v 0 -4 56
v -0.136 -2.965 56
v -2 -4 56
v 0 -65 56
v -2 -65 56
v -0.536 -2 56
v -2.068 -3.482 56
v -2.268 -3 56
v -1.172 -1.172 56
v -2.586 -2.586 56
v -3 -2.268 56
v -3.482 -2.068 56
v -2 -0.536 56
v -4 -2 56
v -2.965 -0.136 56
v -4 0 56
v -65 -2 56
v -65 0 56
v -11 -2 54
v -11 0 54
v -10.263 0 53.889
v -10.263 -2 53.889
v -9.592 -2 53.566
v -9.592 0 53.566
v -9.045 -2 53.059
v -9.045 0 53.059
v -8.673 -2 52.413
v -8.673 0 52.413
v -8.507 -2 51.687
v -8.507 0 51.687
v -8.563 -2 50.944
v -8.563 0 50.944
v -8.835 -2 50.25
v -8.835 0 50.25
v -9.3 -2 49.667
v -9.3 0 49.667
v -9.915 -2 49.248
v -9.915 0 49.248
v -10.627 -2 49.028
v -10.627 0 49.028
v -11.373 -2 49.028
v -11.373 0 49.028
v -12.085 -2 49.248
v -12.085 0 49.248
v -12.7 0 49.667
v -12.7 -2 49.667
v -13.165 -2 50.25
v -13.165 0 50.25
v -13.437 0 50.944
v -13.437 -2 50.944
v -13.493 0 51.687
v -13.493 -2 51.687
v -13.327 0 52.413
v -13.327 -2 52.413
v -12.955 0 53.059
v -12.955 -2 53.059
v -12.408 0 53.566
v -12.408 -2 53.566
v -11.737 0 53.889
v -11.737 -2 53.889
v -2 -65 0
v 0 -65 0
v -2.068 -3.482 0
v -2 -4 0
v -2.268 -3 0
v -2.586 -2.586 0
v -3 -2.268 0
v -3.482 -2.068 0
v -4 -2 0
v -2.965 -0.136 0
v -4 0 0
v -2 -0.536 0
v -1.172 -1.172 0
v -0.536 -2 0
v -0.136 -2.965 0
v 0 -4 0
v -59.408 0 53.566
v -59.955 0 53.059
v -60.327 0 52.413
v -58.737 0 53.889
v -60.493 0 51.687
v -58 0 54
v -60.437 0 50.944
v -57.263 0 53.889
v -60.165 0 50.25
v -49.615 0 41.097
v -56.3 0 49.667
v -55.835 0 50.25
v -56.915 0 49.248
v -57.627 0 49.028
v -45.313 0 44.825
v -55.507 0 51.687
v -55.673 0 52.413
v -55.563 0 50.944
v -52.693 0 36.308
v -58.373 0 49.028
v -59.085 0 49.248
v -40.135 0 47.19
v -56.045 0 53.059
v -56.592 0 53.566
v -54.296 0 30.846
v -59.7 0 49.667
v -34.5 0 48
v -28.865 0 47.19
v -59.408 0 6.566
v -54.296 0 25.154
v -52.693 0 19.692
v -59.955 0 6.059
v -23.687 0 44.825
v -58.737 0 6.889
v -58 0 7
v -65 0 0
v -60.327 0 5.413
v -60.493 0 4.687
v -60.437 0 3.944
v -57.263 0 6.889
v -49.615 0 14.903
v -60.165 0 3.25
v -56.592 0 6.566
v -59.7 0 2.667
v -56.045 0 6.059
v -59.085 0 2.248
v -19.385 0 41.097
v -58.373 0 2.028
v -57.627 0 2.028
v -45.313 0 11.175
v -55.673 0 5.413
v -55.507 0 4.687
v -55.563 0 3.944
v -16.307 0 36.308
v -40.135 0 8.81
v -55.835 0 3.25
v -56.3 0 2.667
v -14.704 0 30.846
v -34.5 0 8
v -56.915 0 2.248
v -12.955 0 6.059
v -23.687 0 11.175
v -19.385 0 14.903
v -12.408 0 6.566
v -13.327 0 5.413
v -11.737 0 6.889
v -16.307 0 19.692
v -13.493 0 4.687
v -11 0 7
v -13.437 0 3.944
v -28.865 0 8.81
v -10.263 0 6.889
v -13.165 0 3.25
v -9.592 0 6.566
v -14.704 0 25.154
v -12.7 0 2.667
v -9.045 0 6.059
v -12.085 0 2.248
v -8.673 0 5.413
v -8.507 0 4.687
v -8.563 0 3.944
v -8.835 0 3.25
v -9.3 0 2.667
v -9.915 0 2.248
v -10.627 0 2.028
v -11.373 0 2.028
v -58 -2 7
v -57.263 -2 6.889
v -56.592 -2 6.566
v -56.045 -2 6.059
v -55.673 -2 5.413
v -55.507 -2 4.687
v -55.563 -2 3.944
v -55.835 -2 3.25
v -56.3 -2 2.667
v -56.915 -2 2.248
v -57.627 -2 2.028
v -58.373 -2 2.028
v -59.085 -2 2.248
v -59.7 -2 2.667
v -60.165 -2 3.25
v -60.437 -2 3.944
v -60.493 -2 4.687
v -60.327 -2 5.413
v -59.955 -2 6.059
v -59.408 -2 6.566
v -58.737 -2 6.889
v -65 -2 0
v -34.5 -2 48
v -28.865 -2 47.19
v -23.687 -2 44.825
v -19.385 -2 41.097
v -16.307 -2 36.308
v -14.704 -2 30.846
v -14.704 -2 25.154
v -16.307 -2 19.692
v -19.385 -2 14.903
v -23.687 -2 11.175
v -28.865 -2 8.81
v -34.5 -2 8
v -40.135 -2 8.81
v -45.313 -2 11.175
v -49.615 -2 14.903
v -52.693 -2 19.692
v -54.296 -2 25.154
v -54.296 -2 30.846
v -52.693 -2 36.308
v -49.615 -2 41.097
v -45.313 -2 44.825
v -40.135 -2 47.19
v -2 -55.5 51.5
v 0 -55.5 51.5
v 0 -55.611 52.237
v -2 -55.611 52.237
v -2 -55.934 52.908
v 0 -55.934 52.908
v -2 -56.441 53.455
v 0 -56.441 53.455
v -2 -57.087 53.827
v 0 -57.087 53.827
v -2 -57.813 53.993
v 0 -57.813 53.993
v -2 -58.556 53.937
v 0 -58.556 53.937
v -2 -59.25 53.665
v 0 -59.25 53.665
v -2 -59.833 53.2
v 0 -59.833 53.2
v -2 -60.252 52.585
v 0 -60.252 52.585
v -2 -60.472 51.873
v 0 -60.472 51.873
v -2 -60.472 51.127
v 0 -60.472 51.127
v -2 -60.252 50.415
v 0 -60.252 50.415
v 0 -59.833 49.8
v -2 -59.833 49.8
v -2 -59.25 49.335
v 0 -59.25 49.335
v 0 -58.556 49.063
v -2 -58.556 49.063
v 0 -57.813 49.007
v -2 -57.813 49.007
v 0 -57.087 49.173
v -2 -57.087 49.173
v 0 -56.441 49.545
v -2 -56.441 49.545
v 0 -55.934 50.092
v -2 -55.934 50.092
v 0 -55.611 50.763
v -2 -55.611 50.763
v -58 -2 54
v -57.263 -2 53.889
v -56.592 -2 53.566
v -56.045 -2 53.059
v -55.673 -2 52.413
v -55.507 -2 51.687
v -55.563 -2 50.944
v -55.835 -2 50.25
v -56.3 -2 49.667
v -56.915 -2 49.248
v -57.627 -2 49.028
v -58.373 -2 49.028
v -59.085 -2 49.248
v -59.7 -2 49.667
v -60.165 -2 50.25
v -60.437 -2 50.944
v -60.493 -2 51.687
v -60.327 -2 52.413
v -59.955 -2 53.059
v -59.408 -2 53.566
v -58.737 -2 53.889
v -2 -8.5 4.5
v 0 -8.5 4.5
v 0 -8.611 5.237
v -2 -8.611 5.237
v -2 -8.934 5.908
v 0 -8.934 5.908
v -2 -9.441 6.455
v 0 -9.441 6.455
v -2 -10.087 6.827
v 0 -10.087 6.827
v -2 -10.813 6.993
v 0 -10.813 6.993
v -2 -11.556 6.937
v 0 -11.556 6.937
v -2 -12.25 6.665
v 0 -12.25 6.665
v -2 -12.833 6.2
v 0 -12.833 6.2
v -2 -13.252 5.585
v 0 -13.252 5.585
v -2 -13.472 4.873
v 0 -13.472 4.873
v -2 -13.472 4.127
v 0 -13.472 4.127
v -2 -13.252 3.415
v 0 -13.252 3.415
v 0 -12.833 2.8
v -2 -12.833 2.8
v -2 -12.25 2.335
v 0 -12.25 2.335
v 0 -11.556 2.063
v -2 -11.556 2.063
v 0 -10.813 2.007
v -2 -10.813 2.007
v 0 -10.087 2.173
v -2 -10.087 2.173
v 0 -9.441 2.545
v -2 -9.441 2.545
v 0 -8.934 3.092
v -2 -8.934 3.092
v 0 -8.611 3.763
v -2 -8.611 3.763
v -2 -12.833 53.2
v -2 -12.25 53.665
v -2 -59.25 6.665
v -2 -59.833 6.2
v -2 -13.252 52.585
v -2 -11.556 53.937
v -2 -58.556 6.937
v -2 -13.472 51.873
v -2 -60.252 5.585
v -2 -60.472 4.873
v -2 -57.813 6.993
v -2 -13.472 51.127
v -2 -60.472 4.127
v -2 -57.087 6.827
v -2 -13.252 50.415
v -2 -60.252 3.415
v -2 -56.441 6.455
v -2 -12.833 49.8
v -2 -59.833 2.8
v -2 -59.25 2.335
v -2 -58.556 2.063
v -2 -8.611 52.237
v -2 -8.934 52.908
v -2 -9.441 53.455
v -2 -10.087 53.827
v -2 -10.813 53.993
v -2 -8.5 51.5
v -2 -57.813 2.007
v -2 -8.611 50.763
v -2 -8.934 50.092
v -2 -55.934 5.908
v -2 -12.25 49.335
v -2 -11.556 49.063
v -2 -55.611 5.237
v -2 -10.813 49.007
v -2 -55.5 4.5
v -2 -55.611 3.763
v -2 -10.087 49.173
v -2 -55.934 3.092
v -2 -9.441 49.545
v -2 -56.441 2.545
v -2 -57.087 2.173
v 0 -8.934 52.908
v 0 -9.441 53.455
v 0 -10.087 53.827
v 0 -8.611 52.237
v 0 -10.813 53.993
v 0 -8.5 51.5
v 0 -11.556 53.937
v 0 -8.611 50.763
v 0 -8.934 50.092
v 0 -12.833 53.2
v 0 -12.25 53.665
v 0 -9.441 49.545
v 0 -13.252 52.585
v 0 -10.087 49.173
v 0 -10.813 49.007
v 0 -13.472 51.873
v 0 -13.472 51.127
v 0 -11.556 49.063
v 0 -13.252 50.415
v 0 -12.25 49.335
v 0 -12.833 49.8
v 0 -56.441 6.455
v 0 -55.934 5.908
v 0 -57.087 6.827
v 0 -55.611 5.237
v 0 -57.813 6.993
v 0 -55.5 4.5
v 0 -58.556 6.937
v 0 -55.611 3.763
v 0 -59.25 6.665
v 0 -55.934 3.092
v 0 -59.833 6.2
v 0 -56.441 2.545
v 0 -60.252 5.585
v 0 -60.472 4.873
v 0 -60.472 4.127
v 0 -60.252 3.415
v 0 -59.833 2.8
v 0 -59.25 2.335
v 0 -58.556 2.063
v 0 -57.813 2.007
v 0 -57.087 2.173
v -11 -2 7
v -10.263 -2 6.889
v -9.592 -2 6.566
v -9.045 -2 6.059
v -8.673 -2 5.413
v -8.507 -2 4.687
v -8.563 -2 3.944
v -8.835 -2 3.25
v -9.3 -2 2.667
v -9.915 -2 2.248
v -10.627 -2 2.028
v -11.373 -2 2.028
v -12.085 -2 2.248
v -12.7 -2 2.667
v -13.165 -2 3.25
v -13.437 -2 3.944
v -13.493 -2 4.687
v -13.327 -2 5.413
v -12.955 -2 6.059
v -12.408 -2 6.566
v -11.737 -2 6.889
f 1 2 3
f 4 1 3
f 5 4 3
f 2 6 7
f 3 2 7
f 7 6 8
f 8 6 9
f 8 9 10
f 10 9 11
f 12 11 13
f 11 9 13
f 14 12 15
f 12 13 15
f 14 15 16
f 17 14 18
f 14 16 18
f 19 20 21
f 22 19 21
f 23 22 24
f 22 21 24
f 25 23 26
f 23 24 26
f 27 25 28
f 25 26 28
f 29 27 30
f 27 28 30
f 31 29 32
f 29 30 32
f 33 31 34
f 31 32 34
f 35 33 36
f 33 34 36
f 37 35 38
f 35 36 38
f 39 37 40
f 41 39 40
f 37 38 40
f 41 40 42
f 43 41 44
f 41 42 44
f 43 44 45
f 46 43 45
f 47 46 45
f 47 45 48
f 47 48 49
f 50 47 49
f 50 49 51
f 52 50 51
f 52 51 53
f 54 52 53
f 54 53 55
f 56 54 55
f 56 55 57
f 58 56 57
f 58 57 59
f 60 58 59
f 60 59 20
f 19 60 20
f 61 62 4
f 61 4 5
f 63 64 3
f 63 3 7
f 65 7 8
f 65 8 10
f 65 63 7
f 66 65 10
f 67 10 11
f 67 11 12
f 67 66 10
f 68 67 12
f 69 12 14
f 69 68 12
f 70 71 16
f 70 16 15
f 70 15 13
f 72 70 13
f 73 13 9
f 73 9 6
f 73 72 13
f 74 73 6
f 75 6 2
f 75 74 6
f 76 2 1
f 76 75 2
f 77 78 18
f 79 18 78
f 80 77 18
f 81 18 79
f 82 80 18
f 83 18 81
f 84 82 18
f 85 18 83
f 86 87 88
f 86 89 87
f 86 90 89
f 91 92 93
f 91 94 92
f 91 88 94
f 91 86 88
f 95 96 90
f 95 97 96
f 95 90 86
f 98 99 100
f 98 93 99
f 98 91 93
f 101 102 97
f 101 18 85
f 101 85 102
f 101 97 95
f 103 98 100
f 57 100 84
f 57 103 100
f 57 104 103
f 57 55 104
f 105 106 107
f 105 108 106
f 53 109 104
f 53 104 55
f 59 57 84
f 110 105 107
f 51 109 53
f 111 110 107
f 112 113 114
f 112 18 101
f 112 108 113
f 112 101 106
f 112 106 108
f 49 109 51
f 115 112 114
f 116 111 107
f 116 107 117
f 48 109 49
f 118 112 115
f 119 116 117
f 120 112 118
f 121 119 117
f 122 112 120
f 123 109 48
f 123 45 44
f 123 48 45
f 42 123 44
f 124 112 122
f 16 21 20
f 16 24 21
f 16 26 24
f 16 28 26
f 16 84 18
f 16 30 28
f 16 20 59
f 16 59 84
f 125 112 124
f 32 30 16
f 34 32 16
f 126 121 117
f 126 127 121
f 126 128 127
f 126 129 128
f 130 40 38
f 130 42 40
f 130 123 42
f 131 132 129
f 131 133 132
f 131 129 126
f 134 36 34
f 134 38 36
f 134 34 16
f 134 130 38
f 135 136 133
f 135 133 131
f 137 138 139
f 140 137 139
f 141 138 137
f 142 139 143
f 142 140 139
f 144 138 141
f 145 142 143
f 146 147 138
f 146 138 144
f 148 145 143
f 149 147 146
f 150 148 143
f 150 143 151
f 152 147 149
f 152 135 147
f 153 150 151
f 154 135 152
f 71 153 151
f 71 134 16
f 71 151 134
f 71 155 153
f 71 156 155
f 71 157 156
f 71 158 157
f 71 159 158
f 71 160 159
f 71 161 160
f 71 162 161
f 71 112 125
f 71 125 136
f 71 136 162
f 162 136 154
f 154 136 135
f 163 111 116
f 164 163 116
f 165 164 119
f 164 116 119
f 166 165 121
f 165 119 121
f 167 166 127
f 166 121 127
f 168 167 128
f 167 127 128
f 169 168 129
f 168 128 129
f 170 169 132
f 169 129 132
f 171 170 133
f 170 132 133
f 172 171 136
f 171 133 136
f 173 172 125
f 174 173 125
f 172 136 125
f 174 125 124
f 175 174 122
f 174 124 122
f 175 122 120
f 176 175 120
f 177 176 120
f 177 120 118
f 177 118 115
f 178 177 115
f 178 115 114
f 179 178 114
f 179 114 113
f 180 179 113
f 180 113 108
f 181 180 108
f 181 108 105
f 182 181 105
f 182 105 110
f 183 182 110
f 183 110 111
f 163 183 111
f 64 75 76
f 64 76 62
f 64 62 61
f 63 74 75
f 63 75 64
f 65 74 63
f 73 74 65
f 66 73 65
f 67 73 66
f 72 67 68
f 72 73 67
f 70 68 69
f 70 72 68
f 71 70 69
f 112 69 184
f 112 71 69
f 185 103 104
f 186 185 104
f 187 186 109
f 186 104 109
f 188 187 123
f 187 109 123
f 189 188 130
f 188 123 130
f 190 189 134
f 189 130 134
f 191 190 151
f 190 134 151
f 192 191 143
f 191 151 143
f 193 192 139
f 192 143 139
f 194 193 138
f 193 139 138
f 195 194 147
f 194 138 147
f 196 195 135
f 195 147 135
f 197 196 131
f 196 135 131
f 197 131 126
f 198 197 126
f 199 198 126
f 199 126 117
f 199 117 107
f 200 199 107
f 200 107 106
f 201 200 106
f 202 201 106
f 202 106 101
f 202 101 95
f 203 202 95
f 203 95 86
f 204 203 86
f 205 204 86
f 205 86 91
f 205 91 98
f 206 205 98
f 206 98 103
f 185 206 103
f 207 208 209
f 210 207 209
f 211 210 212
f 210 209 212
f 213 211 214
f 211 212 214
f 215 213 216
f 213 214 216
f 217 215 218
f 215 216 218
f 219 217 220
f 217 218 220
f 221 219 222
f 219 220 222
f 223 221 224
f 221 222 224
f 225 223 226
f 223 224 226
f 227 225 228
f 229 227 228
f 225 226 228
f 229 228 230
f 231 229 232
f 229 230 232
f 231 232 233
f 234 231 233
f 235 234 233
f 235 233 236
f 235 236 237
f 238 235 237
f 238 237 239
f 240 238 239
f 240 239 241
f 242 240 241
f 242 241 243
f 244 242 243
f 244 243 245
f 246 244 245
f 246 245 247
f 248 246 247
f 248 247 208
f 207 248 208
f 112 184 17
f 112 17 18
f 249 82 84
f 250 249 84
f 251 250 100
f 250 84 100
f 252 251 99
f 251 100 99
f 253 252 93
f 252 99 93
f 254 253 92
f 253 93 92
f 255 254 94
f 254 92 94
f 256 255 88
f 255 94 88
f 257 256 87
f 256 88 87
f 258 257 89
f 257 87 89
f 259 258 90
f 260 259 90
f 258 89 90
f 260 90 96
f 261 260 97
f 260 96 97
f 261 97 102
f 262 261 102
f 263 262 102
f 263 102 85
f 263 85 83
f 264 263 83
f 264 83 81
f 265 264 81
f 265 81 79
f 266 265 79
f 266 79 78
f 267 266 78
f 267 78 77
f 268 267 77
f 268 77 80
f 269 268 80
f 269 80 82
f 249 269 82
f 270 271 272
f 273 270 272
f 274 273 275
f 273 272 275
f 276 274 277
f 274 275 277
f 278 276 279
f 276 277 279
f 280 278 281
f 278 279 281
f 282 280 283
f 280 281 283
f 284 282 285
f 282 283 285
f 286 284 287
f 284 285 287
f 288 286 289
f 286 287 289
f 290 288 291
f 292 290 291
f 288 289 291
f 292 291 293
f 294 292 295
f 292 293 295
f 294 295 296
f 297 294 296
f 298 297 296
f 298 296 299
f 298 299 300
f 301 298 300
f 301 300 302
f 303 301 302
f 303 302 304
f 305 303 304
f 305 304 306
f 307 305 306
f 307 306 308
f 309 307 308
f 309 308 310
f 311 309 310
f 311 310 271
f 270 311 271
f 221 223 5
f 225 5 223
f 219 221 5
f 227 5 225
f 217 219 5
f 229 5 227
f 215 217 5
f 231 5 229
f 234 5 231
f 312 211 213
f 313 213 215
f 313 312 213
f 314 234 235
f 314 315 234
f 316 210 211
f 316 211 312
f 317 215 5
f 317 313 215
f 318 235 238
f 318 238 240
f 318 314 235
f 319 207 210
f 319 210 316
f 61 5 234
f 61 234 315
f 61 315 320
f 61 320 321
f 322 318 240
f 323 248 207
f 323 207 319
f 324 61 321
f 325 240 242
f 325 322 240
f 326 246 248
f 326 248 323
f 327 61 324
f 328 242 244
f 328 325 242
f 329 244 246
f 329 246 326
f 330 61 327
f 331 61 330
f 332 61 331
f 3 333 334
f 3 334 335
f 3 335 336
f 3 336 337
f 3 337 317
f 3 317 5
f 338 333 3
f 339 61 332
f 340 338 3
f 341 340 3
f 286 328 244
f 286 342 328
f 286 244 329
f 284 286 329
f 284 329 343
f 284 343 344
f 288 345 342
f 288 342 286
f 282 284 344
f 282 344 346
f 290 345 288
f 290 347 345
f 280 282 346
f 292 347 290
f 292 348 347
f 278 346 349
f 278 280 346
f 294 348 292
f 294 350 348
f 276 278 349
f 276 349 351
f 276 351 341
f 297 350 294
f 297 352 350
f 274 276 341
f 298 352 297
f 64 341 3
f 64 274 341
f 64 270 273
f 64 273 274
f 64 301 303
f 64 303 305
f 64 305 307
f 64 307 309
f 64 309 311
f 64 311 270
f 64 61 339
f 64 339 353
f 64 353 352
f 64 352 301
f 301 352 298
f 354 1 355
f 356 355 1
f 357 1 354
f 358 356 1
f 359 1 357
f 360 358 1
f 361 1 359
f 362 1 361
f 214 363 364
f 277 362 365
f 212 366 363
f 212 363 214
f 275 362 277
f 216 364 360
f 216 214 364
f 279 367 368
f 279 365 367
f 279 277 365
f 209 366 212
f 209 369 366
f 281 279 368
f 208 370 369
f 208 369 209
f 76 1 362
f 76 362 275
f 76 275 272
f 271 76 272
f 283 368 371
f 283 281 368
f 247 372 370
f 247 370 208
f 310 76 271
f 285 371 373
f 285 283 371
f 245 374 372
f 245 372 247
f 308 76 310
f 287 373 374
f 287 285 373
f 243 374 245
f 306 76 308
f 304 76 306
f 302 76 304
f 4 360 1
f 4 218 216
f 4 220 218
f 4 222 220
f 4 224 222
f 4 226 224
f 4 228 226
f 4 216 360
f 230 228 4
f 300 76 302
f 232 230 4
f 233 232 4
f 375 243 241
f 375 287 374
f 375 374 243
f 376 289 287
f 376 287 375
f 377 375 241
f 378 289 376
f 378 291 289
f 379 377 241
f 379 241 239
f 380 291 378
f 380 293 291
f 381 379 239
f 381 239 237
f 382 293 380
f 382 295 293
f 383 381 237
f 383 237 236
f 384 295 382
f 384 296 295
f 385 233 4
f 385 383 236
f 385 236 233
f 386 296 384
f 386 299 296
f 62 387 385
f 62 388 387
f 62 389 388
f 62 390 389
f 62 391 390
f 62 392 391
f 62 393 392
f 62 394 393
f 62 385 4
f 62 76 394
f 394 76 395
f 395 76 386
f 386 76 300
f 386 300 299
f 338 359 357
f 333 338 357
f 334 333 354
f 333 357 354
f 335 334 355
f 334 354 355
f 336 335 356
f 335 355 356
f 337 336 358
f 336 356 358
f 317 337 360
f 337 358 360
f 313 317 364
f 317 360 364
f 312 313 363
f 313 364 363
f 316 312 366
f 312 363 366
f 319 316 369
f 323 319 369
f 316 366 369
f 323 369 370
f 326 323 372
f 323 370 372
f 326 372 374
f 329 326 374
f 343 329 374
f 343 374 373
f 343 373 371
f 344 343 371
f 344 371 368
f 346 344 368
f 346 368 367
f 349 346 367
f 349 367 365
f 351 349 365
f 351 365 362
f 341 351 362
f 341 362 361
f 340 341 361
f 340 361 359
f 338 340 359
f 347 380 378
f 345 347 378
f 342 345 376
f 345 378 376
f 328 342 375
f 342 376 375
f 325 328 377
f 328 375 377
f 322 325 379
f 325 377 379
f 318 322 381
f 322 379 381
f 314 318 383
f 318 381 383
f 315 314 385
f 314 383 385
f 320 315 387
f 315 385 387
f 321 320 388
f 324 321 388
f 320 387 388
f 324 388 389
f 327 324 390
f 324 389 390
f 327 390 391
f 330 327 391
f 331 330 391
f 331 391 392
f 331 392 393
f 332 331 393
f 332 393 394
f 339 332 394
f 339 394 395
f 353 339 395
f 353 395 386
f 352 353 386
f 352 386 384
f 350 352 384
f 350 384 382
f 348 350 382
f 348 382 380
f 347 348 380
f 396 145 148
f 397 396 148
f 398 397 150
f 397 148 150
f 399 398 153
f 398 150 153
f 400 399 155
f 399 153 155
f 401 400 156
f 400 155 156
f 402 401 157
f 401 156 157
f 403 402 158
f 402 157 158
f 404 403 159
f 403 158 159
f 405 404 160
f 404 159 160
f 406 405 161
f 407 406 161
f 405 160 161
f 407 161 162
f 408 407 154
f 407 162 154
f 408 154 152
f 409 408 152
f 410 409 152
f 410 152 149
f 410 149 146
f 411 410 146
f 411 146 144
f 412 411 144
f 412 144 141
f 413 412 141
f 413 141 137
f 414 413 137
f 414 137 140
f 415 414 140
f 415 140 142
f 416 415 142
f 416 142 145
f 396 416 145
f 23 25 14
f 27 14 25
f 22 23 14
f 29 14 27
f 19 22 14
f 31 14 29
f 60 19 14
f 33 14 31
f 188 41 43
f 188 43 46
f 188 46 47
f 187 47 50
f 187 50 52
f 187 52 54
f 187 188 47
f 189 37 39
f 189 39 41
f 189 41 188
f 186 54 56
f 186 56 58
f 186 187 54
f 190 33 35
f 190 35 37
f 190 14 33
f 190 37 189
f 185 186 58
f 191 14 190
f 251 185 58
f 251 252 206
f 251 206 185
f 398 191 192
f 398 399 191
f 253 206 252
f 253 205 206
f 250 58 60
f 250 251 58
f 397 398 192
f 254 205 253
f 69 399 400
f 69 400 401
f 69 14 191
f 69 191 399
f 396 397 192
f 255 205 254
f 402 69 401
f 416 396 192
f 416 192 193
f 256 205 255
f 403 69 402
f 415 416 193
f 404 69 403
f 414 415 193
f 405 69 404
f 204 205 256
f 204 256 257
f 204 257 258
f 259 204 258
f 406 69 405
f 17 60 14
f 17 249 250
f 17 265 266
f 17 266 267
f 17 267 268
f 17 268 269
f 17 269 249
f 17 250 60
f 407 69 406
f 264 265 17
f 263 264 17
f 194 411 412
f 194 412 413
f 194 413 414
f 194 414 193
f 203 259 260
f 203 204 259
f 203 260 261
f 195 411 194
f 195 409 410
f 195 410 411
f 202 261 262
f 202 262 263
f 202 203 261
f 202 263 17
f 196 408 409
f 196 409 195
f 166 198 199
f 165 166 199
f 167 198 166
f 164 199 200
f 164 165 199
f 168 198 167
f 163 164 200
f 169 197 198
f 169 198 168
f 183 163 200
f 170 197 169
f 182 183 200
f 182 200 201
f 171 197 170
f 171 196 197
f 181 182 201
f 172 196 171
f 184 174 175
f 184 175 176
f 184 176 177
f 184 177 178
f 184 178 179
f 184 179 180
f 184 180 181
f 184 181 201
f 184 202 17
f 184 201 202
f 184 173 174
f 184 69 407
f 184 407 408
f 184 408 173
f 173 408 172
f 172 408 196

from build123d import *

# Parameters (mm, degrees)
T_LE_DE_BASE_PLI_E1_DEPTH = 56
ENL_V_MAT_EXTRU_1_REACH   = 109.638
ESQUISSE6_R               = 2.5
ESQUISSE6_R_2             = 20
ENL_V_MAT_EXTRU_2_REACH   = 109.638
ESQUISSE7_R               = 2.5


# Sheet-metal steps are written as plain solids
with BuildPart() as part:
    # Esquisse1 → Tôle de base pliée1 (new body)
    with BuildSketch(Plane.XY):
        with BuildLine():
            Line((-65, 0), (-4, 0))
            ThreePointArc((-4, 0), (-1.171572875, -1.171572875), (0, -4))
            Line((0, -4), (0, -65))
            Line((0, -65), (-2, -65))
            Line((-2, -65), (-2, -4))
            ThreePointArc((-2, -4), (-2.585786438, -2.585786438), (-4, -2))
            Line((-4, -2), (-65, -2))
            Line((-65, -2), (-65, 0))
        make_face()
    extrude(amount=T_LE_DE_BASE_PLI_E1_DEPTH)

    # Esquisse6 → Enlèv. mat.-Extru.1 (cut, up to next)
    with BuildSketch(Plane(origin=(0, 0, 0), x_dir=(1, 0, 0), z_dir=(0, 1, 0)), mode=Mode.PRIVATE) as enl_v_mat_extru_1_sk1:
        with Locations(Location((-58, -4.5, 0), (0, 0, 270))):
            Circle(ESQUISSE6_R)
    enl_v_mat_extru_1_tool1 = extrude(enl_v_mat_extru_1_sk1.sketch, amount=-ENL_V_MAT_EXTRU_1_REACH, mode=Mode.PRIVATE) & part.part
    # Esquisse6 → Enlèv. mat.-Extru.1 (cut, up to next)
    with BuildSketch(Plane(origin=(0, 0, 0), x_dir=(1, 0, 0), z_dir=(0, 1, 0)), mode=Mode.PRIVATE) as enl_v_mat_extru_1_sk2:
        with Locations(Location((-11, -4.5, 0), (0, 0, 270))):
            Circle(ESQUISSE6_R)
    enl_v_mat_extru_1_tool2 = extrude(enl_v_mat_extru_1_sk2.sketch, amount=-ENL_V_MAT_EXTRU_1_REACH, mode=Mode.PRIVATE) & part.part
    # Esquisse6 → Enlèv. mat.-Extru.1 (cut, up to next)
    with BuildSketch(Plane(origin=(0, 0, 0), x_dir=(1, 0, 0), z_dir=(0, 1, 0)), mode=Mode.PRIVATE) as enl_v_mat_extru_1_sk3:
        with Locations(Location((-11, -51.5, 0), (0, 0, 270))):
            Circle(ESQUISSE6_R)
    enl_v_mat_extru_1_tool3 = extrude(enl_v_mat_extru_1_sk3.sketch, amount=-ENL_V_MAT_EXTRU_1_REACH, mode=Mode.PRIVATE) & part.part
    # Esquisse6 → Enlèv. mat.-Extru.1 (cut, up to next)
    with BuildSketch(Plane(origin=(0, 0, 0), x_dir=(1, 0, 0), z_dir=(0, 1, 0)), mode=Mode.PRIVATE) as enl_v_mat_extru_1_sk4:
        with Locations(Location((-58, -51.5, 0), (0, 0, 270))):
            Circle(ESQUISSE6_R)
    enl_v_mat_extru_1_tool4 = extrude(enl_v_mat_extru_1_sk4.sketch, amount=-ENL_V_MAT_EXTRU_1_REACH, mode=Mode.PRIVATE) & part.part
    # Esquisse6 → Enlèv. mat.-Extru.1 (cut, up to next)
    with BuildSketch(Plane(origin=(0, 0, 0), x_dir=(1, 0, 0), z_dir=(0, 1, 0)), mode=Mode.PRIVATE) as enl_v_mat_extru_1_sk5:
        with Locations(Location((-34.5, -28, 0), (0, 0, 270))):
            Circle(ESQUISSE6_R_2)
    enl_v_mat_extru_1_tool5 = extrude(enl_v_mat_extru_1_sk5.sketch, amount=-ENL_V_MAT_EXTRU_1_REACH, mode=Mode.PRIVATE) & part.part
    add(enl_v_mat_extru_1_tool1.solids().sort_by_distance((-58, 0, 4.5))[0], mode=Mode.SUBTRACT)
    add(enl_v_mat_extru_1_tool2.solids().sort_by_distance((-11, 0, 4.5))[0], mode=Mode.SUBTRACT)
    add(enl_v_mat_extru_1_tool3.solids().sort_by_distance((-11, 0, 51.5))[0], mode=Mode.SUBTRACT)
    add(enl_v_mat_extru_1_tool4.solids().sort_by_distance((-58, 0, 51.5))[0], mode=Mode.SUBTRACT)
    add(enl_v_mat_extru_1_tool5.solids().sort_by_distance((-34.5, 0, 28))[0], mode=Mode.SUBTRACT)

    # Esquisse7 → Enlèv. mat.-Extru.2 (cut, up to next)
    with BuildSketch(Plane(origin=(0, 0, 0), x_dir=(0, 0, -1), z_dir=(1, 0, 0)), mode=Mode.PRIVATE) as enl_v_mat_extru_2_sk1:
        with Locations(Location((-4.5, -11, 0), (0, 0, 90))):
            Circle(ESQUISSE7_R)
    enl_v_mat_extru_2_tool1 = extrude(enl_v_mat_extru_2_sk1.sketch, amount=-ENL_V_MAT_EXTRU_2_REACH, mode=Mode.PRIVATE) & part.part
    # Esquisse7 → Enlèv. mat.-Extru.2 (cut, up to next)
    with BuildSketch(Plane(origin=(0, 0, 0), x_dir=(0, 0, -1), z_dir=(1, 0, 0)), mode=Mode.PRIVATE) as enl_v_mat_extru_2_sk2:
        with Locations(Location((-4.5, -58, 0), (0, 0, 90))):
            Circle(ESQUISSE7_R)
    enl_v_mat_extru_2_tool2 = extrude(enl_v_mat_extru_2_sk2.sketch, amount=-ENL_V_MAT_EXTRU_2_REACH, mode=Mode.PRIVATE) & part.part
    # Esquisse7 → Enlèv. mat.-Extru.2 (cut, up to next)
    with BuildSketch(Plane(origin=(0, 0, 0), x_dir=(0, 0, -1), z_dir=(1, 0, 0)), mode=Mode.PRIVATE) as enl_v_mat_extru_2_sk3:
        with Locations(Location((-51.5, -58, 0), (0, 0, 90))):
            Circle(ESQUISSE7_R)
    enl_v_mat_extru_2_tool3 = extrude(enl_v_mat_extru_2_sk3.sketch, amount=-ENL_V_MAT_EXTRU_2_REACH, mode=Mode.PRIVATE) & part.part
    # Esquisse7 → Enlèv. mat.-Extru.2 (cut, up to next)
    with BuildSketch(Plane(origin=(0, 0, 0), x_dir=(0, 0, -1), z_dir=(1, 0, 0)), mode=Mode.PRIVATE) as enl_v_mat_extru_2_sk4:
        with Locations(Location((-51.5, -11, 0), (0, 0, 90))):
            Circle(ESQUISSE7_R)
    enl_v_mat_extru_2_tool4 = extrude(enl_v_mat_extru_2_sk4.sketch, amount=-ENL_V_MAT_EXTRU_2_REACH, mode=Mode.PRIVATE) & part.part
    add(enl_v_mat_extru_2_tool1.solids().sort_by_distance((0, -11, 4.5))[0], mode=Mode.SUBTRACT)
    add(enl_v_mat_extru_2_tool2.solids().sort_by_distance((0, -58, 4.5))[0], mode=Mode.SUBTRACT)
    add(enl_v_mat_extru_2_tool3.solids().sort_by_distance((0, -58, 51.5))[0], mode=Mode.SUBTRACT)
    add(enl_v_mat_extru_2_tool4.solids().sort_by_distance((0, -11, 51.5))[0], mode=Mode.SUBTRACT)


solid = part.part
